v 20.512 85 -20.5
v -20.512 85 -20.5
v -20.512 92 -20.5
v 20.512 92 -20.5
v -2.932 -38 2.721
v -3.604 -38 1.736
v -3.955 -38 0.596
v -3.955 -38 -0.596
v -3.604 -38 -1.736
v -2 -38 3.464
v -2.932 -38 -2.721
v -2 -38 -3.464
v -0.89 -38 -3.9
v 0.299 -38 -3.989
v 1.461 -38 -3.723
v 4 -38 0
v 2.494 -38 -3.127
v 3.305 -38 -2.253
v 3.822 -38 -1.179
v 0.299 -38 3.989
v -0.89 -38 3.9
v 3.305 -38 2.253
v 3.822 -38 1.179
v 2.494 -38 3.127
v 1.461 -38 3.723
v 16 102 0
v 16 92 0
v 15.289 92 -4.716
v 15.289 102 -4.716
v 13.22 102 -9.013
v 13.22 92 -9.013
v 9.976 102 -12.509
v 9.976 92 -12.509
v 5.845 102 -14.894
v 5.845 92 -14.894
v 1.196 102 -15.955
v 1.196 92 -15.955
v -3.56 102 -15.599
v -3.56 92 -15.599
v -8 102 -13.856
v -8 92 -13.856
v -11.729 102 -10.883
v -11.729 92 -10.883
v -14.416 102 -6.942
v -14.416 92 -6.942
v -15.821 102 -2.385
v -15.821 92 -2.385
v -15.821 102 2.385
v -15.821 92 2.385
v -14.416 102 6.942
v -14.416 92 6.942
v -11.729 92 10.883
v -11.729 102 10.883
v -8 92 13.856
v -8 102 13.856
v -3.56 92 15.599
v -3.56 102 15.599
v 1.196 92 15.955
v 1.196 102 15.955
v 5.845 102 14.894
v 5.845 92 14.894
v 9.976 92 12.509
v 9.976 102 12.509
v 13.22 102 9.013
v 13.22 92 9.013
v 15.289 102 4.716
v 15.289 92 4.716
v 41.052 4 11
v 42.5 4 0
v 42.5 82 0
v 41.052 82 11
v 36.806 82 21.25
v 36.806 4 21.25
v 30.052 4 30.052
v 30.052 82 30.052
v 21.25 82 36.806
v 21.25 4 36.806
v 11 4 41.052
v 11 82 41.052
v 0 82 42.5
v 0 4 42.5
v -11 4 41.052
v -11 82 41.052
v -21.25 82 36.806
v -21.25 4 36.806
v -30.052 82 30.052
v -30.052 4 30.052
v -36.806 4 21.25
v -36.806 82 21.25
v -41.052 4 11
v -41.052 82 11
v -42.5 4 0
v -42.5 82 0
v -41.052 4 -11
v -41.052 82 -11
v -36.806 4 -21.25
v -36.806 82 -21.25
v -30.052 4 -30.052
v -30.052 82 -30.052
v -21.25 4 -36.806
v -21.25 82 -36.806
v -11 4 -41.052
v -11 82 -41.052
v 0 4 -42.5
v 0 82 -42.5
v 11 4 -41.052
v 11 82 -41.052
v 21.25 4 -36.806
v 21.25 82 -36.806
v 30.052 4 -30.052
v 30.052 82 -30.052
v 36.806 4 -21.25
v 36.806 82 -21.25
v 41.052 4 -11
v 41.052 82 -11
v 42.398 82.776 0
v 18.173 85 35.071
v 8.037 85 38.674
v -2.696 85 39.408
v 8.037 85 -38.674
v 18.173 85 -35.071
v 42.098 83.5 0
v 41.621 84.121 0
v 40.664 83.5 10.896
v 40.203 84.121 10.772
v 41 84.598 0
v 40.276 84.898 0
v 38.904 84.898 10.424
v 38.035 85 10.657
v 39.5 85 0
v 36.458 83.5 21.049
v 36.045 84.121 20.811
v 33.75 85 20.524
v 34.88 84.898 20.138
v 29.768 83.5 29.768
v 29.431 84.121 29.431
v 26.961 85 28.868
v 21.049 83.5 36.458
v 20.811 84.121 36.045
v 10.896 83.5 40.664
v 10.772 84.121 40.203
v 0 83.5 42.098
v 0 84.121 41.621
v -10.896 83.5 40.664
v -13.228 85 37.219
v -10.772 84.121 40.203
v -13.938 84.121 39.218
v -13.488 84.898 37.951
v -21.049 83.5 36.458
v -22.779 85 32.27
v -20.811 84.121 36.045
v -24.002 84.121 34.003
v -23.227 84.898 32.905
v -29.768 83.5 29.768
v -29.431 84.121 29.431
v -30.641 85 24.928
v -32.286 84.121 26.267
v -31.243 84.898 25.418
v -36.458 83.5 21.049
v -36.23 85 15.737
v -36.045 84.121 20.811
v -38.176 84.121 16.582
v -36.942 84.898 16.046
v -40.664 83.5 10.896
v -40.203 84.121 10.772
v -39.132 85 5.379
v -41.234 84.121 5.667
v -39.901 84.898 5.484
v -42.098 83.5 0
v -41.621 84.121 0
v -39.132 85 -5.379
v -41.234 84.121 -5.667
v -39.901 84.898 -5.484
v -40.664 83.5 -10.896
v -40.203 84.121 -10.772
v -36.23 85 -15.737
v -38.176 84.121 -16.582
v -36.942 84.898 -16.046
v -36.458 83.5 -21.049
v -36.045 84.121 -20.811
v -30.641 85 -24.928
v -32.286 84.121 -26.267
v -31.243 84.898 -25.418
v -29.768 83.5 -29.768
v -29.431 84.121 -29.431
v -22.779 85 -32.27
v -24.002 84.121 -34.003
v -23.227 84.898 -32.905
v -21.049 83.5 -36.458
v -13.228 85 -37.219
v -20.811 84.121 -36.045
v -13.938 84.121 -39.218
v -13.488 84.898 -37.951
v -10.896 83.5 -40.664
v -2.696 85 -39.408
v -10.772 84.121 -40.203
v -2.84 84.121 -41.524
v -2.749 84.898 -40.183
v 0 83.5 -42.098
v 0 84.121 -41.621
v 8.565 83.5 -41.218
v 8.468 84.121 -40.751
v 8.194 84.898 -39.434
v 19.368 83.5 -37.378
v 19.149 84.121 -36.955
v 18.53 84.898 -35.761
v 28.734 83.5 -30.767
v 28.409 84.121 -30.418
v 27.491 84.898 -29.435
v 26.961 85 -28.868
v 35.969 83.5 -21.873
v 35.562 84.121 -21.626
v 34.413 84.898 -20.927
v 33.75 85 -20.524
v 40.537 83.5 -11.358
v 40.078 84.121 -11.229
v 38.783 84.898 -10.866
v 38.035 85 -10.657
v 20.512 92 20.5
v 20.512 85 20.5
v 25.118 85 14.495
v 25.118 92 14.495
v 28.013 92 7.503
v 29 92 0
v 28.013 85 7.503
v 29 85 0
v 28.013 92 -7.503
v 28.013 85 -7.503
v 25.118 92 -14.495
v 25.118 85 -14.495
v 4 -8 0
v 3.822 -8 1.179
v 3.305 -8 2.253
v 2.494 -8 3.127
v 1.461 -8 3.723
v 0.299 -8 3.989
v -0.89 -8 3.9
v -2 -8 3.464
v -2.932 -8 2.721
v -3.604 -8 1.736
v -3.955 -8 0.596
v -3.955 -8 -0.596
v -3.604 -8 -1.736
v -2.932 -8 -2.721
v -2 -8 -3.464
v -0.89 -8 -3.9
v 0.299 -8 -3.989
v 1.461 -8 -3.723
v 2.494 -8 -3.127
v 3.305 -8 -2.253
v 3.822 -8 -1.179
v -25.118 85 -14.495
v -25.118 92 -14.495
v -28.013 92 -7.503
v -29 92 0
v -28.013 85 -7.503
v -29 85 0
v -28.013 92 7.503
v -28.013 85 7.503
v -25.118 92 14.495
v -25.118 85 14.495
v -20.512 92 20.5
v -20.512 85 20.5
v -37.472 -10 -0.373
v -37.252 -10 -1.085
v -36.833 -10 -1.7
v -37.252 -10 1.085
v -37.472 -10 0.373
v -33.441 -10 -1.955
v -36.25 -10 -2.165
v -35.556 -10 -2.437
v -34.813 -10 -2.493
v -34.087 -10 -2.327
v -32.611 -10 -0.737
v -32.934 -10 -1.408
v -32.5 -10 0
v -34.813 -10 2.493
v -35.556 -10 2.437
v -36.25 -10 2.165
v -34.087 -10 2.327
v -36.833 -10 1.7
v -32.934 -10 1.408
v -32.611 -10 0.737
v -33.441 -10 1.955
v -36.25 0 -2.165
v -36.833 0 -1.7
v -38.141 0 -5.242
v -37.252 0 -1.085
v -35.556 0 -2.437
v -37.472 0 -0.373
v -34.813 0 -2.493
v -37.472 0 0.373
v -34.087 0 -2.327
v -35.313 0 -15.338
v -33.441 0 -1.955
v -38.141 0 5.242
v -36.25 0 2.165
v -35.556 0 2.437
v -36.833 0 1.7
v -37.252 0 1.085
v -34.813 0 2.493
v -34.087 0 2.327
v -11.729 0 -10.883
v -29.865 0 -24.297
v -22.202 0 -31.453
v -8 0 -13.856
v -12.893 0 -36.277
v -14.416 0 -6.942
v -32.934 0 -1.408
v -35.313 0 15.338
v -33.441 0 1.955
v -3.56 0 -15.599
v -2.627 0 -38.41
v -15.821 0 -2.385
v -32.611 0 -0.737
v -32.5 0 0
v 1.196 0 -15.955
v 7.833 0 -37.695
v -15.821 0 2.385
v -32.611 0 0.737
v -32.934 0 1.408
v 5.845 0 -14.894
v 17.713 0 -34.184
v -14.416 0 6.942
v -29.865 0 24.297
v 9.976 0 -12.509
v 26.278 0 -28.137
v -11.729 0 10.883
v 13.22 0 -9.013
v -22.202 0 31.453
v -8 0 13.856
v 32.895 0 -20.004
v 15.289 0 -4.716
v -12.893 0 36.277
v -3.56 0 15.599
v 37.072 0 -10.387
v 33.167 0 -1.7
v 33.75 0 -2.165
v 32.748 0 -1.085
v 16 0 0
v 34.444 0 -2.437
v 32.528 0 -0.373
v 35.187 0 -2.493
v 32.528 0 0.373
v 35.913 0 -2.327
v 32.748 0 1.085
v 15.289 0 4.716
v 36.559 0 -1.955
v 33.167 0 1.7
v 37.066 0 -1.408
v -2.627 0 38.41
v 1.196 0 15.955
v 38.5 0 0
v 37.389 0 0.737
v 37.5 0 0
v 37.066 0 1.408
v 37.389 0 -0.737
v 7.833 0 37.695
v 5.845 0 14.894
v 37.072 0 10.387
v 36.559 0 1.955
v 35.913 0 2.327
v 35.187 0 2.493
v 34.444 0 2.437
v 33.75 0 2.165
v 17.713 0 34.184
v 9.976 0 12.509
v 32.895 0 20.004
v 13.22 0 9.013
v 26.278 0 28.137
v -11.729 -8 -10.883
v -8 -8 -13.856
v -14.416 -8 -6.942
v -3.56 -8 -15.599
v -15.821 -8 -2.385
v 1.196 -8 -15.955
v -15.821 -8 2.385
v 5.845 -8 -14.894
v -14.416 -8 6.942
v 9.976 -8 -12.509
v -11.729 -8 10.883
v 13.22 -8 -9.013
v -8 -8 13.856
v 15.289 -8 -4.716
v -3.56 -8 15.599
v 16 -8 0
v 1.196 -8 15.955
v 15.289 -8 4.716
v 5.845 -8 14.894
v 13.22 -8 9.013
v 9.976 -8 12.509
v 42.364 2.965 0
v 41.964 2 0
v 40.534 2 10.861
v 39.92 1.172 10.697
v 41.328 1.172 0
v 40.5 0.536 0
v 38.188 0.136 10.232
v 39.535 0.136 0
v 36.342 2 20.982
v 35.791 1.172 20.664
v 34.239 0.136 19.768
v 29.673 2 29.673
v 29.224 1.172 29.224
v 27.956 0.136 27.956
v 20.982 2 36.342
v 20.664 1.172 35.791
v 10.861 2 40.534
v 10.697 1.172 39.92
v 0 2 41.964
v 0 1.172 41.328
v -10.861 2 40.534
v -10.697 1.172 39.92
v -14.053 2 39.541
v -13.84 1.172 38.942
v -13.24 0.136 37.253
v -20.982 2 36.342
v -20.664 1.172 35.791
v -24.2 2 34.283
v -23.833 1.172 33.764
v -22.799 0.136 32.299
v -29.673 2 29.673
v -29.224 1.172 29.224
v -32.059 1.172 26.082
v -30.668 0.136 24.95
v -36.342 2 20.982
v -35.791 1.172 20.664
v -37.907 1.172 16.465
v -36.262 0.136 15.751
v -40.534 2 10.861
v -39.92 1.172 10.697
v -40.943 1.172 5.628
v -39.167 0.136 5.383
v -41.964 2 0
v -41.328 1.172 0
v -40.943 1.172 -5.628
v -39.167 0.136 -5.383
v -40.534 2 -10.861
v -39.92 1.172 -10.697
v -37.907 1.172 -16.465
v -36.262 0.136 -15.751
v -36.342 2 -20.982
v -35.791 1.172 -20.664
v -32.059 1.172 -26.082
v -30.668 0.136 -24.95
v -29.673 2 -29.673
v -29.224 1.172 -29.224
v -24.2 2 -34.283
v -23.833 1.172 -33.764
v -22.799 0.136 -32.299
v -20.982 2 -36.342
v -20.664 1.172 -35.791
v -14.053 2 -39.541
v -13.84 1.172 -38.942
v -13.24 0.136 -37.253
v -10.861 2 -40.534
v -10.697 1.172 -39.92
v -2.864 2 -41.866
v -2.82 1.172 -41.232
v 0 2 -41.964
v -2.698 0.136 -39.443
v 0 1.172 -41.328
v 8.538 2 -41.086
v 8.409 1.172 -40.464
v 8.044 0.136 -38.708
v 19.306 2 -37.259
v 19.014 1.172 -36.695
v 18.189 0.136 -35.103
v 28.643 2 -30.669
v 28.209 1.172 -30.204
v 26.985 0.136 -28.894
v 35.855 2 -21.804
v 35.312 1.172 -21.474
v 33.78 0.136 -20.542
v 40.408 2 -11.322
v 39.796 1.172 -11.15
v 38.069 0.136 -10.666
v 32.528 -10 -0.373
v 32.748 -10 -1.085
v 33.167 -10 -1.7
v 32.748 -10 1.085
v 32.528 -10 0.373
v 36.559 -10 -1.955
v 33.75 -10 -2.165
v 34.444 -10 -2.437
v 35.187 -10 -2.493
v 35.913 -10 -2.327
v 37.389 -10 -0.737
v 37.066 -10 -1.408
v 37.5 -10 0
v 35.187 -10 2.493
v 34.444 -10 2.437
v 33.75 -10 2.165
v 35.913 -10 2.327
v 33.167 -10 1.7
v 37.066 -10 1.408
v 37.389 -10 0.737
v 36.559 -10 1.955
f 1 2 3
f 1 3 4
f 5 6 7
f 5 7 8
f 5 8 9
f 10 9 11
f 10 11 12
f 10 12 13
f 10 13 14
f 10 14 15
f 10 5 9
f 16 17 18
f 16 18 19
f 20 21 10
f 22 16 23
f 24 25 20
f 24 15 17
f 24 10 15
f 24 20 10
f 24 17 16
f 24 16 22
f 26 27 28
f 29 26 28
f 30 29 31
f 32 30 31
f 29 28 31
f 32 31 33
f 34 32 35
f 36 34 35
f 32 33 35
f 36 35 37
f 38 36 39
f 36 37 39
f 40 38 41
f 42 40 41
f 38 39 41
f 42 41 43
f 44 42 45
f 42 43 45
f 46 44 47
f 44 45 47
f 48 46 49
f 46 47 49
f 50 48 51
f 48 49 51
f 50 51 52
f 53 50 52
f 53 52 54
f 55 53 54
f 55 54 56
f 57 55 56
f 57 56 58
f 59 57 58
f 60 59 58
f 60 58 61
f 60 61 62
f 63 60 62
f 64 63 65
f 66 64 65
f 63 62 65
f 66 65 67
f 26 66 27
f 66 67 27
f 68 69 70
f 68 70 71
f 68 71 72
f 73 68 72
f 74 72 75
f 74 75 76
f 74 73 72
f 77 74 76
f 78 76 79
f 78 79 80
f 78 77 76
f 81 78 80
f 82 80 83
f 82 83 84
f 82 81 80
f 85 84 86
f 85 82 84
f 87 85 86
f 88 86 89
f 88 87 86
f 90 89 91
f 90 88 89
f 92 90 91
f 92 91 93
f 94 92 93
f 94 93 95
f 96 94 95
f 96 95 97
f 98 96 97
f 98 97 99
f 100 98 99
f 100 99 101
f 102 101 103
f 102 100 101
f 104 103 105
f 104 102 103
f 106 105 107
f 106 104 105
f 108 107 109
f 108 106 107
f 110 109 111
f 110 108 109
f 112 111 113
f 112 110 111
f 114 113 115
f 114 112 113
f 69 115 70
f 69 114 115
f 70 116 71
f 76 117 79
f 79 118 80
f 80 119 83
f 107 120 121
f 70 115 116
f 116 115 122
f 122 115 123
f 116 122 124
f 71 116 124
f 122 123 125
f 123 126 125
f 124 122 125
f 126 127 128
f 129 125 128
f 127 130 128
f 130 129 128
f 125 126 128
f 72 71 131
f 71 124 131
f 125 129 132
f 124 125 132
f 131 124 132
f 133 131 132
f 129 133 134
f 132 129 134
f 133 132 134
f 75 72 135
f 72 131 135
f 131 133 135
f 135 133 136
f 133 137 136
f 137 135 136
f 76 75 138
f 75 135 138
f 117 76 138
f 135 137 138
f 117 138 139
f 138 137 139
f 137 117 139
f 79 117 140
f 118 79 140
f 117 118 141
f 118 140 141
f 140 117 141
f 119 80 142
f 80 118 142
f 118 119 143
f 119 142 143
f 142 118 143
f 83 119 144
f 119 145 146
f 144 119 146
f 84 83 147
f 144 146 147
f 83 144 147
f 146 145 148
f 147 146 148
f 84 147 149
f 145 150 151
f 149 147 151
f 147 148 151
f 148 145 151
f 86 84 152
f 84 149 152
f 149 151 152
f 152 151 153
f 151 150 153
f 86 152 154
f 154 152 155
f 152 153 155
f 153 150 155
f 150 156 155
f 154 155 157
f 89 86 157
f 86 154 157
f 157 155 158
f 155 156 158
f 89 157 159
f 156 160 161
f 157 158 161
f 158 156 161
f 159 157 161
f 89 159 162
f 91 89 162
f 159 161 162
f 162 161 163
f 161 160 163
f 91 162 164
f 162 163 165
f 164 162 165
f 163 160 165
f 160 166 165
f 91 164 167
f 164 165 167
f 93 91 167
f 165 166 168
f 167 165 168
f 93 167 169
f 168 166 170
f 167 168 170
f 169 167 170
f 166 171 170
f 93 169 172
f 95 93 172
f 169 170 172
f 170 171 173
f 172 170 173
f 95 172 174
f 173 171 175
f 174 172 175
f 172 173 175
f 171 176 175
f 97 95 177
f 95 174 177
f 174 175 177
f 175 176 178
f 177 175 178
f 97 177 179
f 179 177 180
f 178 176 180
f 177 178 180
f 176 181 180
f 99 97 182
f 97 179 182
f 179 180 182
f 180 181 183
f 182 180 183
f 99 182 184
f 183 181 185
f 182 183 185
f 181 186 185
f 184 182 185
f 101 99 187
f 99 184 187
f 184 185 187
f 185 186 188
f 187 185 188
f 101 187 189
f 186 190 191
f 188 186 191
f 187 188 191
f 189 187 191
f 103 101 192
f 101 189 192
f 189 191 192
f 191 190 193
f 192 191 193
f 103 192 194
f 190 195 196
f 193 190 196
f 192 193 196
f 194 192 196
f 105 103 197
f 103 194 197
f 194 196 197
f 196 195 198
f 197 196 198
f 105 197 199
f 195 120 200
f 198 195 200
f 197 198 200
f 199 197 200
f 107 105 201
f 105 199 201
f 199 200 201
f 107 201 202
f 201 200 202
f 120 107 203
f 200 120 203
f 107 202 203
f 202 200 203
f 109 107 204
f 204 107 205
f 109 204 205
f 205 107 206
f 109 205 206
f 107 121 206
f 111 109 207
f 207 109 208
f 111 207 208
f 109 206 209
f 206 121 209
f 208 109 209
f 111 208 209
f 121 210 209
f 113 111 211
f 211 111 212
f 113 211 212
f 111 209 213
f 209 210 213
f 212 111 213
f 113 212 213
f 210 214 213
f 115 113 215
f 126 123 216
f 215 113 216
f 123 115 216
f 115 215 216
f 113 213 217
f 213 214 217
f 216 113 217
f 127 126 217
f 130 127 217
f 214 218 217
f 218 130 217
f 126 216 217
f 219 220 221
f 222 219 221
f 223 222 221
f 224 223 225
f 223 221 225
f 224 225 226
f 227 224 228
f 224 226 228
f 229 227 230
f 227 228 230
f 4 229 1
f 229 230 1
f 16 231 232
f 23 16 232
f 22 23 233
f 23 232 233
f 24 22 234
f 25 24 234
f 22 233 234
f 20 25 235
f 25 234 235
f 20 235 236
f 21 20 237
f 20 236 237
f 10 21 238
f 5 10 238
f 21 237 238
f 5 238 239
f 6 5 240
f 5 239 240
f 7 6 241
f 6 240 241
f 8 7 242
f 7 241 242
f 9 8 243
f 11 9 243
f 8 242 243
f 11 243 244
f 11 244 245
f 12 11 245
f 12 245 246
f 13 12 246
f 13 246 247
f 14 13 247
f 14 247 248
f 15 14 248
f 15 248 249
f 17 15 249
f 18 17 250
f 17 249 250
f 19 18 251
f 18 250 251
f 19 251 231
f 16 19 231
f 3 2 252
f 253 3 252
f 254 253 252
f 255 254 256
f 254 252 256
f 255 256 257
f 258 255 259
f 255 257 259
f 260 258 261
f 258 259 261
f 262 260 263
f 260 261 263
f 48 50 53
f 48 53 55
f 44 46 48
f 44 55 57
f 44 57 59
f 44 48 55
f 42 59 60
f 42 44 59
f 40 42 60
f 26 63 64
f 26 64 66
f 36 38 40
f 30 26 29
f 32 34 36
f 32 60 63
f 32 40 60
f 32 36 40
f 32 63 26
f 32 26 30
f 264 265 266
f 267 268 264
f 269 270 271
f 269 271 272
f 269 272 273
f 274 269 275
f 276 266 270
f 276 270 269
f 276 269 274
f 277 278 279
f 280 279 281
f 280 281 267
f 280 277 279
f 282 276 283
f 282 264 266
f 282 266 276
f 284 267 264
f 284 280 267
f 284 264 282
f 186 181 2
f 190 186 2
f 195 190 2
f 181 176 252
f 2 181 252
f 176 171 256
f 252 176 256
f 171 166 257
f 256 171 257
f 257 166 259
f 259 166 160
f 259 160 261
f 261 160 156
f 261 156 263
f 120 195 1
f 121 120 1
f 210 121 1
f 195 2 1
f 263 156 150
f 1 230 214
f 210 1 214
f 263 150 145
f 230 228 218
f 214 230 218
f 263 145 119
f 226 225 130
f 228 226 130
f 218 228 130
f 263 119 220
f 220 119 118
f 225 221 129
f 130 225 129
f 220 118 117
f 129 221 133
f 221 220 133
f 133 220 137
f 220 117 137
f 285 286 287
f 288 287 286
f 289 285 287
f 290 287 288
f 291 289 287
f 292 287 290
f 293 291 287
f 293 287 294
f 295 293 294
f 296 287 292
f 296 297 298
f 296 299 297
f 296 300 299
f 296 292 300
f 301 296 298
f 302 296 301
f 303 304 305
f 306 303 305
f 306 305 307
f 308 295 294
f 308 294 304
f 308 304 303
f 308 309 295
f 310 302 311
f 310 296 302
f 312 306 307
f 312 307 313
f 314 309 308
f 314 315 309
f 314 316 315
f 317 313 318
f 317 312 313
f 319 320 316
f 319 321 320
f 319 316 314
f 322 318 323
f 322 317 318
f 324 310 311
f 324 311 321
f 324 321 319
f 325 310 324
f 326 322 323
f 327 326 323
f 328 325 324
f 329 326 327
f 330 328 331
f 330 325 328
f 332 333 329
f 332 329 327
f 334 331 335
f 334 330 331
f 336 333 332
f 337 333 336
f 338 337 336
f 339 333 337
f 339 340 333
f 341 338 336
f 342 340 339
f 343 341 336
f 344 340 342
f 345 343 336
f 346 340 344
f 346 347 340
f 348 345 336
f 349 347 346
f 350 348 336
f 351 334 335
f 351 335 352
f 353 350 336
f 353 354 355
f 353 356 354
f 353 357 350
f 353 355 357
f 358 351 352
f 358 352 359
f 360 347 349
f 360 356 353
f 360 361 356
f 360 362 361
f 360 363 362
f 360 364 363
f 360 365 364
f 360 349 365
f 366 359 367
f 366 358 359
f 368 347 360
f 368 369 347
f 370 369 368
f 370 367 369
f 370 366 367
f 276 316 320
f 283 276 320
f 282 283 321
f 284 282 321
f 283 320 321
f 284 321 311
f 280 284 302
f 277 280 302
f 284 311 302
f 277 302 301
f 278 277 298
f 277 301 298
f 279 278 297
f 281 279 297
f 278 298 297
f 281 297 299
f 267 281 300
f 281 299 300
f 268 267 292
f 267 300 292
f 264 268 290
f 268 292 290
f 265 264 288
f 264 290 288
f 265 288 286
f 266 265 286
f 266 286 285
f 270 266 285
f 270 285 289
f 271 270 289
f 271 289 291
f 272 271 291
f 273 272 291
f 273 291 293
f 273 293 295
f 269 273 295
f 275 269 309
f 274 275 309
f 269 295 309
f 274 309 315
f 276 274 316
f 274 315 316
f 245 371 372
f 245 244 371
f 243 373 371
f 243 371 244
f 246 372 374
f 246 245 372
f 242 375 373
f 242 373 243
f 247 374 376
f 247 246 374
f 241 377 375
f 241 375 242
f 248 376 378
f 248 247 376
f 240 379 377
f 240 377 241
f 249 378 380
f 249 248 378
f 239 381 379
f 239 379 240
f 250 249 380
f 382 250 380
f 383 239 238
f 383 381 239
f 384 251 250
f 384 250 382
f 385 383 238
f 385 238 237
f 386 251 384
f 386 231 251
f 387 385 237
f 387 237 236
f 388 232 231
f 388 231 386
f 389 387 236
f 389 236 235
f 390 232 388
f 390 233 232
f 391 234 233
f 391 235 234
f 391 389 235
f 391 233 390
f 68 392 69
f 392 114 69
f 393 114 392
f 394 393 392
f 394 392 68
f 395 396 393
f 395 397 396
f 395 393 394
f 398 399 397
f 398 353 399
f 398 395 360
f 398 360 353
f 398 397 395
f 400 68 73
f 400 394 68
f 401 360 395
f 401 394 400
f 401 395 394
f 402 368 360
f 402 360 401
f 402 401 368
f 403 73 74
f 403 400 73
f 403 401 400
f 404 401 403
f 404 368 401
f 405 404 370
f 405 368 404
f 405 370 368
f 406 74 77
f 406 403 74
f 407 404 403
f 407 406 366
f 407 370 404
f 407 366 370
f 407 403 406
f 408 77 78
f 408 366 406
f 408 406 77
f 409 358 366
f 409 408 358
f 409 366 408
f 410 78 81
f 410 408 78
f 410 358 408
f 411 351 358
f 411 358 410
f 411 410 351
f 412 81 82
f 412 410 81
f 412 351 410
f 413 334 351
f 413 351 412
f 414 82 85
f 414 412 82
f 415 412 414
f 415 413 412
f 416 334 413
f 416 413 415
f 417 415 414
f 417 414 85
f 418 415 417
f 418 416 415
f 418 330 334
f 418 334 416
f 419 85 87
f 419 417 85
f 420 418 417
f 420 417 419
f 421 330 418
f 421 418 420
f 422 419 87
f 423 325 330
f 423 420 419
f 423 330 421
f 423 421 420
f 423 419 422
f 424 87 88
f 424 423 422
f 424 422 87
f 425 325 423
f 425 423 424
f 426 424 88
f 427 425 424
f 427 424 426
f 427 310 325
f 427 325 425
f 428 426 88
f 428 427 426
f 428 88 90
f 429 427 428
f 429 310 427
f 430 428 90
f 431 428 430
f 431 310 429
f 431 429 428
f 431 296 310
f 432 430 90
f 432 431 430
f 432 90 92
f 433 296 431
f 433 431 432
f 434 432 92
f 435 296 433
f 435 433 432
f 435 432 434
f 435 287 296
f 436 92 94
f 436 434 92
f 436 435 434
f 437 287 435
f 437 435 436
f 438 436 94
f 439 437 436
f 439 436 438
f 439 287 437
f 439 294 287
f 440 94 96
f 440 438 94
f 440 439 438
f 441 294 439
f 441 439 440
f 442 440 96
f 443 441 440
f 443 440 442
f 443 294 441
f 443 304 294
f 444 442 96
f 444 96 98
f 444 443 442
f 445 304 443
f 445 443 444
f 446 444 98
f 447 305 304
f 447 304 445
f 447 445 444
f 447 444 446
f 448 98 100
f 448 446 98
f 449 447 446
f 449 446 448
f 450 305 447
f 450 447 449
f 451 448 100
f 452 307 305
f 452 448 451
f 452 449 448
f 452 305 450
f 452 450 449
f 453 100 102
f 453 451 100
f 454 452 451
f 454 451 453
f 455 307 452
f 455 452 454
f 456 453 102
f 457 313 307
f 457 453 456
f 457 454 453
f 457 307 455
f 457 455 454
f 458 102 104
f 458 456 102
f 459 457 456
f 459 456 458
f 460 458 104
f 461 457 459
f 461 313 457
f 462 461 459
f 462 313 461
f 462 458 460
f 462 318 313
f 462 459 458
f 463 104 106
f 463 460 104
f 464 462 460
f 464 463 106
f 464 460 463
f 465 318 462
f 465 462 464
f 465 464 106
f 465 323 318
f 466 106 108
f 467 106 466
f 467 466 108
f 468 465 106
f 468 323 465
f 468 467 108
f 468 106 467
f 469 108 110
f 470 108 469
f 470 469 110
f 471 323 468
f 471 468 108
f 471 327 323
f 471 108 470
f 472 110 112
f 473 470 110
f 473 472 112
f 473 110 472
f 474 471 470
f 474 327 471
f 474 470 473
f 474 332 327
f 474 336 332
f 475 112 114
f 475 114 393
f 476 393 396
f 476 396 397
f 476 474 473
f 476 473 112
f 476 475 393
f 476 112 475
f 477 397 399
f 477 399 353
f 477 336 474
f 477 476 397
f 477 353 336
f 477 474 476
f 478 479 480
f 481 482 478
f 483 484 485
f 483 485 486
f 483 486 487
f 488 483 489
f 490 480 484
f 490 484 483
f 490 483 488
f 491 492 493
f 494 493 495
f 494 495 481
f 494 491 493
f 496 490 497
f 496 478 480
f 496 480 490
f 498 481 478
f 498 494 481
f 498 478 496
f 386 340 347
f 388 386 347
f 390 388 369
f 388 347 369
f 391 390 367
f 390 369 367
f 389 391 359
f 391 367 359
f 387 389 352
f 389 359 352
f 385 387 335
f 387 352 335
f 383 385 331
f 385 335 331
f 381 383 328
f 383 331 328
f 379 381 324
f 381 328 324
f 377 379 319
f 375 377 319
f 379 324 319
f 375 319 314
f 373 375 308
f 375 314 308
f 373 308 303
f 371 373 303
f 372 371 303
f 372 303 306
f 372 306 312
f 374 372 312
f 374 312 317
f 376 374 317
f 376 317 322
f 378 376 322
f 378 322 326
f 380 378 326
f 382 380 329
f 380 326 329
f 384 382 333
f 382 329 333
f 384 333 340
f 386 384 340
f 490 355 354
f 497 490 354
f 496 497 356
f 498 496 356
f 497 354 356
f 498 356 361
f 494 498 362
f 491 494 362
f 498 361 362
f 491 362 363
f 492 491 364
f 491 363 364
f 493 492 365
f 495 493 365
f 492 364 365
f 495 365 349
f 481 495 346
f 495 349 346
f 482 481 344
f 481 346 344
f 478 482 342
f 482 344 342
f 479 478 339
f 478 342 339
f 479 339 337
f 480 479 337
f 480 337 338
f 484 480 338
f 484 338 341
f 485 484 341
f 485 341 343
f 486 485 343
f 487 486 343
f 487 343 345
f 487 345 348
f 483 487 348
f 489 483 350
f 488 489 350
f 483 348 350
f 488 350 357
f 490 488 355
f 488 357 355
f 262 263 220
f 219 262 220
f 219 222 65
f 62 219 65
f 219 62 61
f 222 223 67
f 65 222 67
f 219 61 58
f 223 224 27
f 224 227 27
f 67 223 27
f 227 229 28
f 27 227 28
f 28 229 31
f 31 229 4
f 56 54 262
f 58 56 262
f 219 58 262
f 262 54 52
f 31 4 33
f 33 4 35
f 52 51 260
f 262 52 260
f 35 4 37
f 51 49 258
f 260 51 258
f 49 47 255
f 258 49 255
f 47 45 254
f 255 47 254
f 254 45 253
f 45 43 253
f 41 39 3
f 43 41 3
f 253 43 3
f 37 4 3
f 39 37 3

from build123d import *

# Parameters (mm, degrees)
SKETCH005_R  = 42.5
PAD005_DEPTH = 85
FILLET_R     = 4
FILLET001_R  = 3
SKETCH006_R  = 16
PAD006_DEPTH = 8
SKETCH007_R  = 4
PAD007_DEPTH = 30
SKETCH008_R  = 2.5
PAD008_DEPTH = 10
PAD009_DEPTH = 7
SKETCH010_R  = 16
PAD010_DEPTH = 10


with BuildPart() as part:
    # Sketch005 → Pad005 (new body)
    with BuildSketch(Plane.XZ):
        Circle(SKETCH005_R)
    extrude(amount=-PAD005_DEPTH)

    # Fillet
    fillet_edges = [part.edges().sort_by_distance(p)[0] for p in [
        (-42.5, 0, 0),
    ]]
    fillet(fillet_edges, radius=FILLET_R)

    # Fillet001
    fillet001_edges = [part.edges().sort_by_distance(p)[0] for p in [
        (-42.5, 85, 0),
    ]]
    fillet(fillet001_edges, radius=FILLET001_R)

    # Sketch006 (on Face5 of Fillet001) → Pad006 (new body)
    with BuildSketch(Plane.XZ):
        Circle(SKETCH006_R)
    extrude(amount=PAD006_DEPTH)

    # Sketch007 (on Face7 of Pad006) → Pad007 (new body)
    with BuildSketch(Plane.XZ.offset(8)):
        Circle(SKETCH007_R)
    extrude(amount=PAD007_DEPTH)

    # Sketch008 (on Face5 of Pad007) → Pad008 (new body)
    with BuildSketch(Plane.XZ):
        with Locations((-35, 0)):
            Circle(SKETCH008_R)
        with Locations((35, 0)):
            Circle(SKETCH008_R)
    extrude(amount=PAD008_DEPTH)

    # Sketch009 (on Face4 of Pad008) → Pad009 (new body)
    with BuildSketch(Plane(origin=(0, 85, 0), x_dir=(1, 0, 0), z_dir=(0, 1, 0))):
        with BuildLine():
            Line((-20.512191, 20.5), (20.512191, 20.5))
            ThreePointArc((20.512191, -20.5), (29, 0), (20.512191, 20.5))
            Line((-20.512191, -20.5), (20.512191, -20.5))
            ThreePointArc((-20.512191, 20.5), (-29, 0), (-20.512191, -20.5))
        make_face()
    extrude(amount=PAD009_DEPTH)

    # Sketch010 (on Face13 of Pad009) → Pad010 (new body)
    with BuildSketch(Plane(origin=(0, 92, 0), x_dir=(1, 0, 0), z_dir=(0, 1, 0))):
        Circle(SKETCH010_R)
    extrude(amount=PAD010_DEPTH)


solid = part.part
